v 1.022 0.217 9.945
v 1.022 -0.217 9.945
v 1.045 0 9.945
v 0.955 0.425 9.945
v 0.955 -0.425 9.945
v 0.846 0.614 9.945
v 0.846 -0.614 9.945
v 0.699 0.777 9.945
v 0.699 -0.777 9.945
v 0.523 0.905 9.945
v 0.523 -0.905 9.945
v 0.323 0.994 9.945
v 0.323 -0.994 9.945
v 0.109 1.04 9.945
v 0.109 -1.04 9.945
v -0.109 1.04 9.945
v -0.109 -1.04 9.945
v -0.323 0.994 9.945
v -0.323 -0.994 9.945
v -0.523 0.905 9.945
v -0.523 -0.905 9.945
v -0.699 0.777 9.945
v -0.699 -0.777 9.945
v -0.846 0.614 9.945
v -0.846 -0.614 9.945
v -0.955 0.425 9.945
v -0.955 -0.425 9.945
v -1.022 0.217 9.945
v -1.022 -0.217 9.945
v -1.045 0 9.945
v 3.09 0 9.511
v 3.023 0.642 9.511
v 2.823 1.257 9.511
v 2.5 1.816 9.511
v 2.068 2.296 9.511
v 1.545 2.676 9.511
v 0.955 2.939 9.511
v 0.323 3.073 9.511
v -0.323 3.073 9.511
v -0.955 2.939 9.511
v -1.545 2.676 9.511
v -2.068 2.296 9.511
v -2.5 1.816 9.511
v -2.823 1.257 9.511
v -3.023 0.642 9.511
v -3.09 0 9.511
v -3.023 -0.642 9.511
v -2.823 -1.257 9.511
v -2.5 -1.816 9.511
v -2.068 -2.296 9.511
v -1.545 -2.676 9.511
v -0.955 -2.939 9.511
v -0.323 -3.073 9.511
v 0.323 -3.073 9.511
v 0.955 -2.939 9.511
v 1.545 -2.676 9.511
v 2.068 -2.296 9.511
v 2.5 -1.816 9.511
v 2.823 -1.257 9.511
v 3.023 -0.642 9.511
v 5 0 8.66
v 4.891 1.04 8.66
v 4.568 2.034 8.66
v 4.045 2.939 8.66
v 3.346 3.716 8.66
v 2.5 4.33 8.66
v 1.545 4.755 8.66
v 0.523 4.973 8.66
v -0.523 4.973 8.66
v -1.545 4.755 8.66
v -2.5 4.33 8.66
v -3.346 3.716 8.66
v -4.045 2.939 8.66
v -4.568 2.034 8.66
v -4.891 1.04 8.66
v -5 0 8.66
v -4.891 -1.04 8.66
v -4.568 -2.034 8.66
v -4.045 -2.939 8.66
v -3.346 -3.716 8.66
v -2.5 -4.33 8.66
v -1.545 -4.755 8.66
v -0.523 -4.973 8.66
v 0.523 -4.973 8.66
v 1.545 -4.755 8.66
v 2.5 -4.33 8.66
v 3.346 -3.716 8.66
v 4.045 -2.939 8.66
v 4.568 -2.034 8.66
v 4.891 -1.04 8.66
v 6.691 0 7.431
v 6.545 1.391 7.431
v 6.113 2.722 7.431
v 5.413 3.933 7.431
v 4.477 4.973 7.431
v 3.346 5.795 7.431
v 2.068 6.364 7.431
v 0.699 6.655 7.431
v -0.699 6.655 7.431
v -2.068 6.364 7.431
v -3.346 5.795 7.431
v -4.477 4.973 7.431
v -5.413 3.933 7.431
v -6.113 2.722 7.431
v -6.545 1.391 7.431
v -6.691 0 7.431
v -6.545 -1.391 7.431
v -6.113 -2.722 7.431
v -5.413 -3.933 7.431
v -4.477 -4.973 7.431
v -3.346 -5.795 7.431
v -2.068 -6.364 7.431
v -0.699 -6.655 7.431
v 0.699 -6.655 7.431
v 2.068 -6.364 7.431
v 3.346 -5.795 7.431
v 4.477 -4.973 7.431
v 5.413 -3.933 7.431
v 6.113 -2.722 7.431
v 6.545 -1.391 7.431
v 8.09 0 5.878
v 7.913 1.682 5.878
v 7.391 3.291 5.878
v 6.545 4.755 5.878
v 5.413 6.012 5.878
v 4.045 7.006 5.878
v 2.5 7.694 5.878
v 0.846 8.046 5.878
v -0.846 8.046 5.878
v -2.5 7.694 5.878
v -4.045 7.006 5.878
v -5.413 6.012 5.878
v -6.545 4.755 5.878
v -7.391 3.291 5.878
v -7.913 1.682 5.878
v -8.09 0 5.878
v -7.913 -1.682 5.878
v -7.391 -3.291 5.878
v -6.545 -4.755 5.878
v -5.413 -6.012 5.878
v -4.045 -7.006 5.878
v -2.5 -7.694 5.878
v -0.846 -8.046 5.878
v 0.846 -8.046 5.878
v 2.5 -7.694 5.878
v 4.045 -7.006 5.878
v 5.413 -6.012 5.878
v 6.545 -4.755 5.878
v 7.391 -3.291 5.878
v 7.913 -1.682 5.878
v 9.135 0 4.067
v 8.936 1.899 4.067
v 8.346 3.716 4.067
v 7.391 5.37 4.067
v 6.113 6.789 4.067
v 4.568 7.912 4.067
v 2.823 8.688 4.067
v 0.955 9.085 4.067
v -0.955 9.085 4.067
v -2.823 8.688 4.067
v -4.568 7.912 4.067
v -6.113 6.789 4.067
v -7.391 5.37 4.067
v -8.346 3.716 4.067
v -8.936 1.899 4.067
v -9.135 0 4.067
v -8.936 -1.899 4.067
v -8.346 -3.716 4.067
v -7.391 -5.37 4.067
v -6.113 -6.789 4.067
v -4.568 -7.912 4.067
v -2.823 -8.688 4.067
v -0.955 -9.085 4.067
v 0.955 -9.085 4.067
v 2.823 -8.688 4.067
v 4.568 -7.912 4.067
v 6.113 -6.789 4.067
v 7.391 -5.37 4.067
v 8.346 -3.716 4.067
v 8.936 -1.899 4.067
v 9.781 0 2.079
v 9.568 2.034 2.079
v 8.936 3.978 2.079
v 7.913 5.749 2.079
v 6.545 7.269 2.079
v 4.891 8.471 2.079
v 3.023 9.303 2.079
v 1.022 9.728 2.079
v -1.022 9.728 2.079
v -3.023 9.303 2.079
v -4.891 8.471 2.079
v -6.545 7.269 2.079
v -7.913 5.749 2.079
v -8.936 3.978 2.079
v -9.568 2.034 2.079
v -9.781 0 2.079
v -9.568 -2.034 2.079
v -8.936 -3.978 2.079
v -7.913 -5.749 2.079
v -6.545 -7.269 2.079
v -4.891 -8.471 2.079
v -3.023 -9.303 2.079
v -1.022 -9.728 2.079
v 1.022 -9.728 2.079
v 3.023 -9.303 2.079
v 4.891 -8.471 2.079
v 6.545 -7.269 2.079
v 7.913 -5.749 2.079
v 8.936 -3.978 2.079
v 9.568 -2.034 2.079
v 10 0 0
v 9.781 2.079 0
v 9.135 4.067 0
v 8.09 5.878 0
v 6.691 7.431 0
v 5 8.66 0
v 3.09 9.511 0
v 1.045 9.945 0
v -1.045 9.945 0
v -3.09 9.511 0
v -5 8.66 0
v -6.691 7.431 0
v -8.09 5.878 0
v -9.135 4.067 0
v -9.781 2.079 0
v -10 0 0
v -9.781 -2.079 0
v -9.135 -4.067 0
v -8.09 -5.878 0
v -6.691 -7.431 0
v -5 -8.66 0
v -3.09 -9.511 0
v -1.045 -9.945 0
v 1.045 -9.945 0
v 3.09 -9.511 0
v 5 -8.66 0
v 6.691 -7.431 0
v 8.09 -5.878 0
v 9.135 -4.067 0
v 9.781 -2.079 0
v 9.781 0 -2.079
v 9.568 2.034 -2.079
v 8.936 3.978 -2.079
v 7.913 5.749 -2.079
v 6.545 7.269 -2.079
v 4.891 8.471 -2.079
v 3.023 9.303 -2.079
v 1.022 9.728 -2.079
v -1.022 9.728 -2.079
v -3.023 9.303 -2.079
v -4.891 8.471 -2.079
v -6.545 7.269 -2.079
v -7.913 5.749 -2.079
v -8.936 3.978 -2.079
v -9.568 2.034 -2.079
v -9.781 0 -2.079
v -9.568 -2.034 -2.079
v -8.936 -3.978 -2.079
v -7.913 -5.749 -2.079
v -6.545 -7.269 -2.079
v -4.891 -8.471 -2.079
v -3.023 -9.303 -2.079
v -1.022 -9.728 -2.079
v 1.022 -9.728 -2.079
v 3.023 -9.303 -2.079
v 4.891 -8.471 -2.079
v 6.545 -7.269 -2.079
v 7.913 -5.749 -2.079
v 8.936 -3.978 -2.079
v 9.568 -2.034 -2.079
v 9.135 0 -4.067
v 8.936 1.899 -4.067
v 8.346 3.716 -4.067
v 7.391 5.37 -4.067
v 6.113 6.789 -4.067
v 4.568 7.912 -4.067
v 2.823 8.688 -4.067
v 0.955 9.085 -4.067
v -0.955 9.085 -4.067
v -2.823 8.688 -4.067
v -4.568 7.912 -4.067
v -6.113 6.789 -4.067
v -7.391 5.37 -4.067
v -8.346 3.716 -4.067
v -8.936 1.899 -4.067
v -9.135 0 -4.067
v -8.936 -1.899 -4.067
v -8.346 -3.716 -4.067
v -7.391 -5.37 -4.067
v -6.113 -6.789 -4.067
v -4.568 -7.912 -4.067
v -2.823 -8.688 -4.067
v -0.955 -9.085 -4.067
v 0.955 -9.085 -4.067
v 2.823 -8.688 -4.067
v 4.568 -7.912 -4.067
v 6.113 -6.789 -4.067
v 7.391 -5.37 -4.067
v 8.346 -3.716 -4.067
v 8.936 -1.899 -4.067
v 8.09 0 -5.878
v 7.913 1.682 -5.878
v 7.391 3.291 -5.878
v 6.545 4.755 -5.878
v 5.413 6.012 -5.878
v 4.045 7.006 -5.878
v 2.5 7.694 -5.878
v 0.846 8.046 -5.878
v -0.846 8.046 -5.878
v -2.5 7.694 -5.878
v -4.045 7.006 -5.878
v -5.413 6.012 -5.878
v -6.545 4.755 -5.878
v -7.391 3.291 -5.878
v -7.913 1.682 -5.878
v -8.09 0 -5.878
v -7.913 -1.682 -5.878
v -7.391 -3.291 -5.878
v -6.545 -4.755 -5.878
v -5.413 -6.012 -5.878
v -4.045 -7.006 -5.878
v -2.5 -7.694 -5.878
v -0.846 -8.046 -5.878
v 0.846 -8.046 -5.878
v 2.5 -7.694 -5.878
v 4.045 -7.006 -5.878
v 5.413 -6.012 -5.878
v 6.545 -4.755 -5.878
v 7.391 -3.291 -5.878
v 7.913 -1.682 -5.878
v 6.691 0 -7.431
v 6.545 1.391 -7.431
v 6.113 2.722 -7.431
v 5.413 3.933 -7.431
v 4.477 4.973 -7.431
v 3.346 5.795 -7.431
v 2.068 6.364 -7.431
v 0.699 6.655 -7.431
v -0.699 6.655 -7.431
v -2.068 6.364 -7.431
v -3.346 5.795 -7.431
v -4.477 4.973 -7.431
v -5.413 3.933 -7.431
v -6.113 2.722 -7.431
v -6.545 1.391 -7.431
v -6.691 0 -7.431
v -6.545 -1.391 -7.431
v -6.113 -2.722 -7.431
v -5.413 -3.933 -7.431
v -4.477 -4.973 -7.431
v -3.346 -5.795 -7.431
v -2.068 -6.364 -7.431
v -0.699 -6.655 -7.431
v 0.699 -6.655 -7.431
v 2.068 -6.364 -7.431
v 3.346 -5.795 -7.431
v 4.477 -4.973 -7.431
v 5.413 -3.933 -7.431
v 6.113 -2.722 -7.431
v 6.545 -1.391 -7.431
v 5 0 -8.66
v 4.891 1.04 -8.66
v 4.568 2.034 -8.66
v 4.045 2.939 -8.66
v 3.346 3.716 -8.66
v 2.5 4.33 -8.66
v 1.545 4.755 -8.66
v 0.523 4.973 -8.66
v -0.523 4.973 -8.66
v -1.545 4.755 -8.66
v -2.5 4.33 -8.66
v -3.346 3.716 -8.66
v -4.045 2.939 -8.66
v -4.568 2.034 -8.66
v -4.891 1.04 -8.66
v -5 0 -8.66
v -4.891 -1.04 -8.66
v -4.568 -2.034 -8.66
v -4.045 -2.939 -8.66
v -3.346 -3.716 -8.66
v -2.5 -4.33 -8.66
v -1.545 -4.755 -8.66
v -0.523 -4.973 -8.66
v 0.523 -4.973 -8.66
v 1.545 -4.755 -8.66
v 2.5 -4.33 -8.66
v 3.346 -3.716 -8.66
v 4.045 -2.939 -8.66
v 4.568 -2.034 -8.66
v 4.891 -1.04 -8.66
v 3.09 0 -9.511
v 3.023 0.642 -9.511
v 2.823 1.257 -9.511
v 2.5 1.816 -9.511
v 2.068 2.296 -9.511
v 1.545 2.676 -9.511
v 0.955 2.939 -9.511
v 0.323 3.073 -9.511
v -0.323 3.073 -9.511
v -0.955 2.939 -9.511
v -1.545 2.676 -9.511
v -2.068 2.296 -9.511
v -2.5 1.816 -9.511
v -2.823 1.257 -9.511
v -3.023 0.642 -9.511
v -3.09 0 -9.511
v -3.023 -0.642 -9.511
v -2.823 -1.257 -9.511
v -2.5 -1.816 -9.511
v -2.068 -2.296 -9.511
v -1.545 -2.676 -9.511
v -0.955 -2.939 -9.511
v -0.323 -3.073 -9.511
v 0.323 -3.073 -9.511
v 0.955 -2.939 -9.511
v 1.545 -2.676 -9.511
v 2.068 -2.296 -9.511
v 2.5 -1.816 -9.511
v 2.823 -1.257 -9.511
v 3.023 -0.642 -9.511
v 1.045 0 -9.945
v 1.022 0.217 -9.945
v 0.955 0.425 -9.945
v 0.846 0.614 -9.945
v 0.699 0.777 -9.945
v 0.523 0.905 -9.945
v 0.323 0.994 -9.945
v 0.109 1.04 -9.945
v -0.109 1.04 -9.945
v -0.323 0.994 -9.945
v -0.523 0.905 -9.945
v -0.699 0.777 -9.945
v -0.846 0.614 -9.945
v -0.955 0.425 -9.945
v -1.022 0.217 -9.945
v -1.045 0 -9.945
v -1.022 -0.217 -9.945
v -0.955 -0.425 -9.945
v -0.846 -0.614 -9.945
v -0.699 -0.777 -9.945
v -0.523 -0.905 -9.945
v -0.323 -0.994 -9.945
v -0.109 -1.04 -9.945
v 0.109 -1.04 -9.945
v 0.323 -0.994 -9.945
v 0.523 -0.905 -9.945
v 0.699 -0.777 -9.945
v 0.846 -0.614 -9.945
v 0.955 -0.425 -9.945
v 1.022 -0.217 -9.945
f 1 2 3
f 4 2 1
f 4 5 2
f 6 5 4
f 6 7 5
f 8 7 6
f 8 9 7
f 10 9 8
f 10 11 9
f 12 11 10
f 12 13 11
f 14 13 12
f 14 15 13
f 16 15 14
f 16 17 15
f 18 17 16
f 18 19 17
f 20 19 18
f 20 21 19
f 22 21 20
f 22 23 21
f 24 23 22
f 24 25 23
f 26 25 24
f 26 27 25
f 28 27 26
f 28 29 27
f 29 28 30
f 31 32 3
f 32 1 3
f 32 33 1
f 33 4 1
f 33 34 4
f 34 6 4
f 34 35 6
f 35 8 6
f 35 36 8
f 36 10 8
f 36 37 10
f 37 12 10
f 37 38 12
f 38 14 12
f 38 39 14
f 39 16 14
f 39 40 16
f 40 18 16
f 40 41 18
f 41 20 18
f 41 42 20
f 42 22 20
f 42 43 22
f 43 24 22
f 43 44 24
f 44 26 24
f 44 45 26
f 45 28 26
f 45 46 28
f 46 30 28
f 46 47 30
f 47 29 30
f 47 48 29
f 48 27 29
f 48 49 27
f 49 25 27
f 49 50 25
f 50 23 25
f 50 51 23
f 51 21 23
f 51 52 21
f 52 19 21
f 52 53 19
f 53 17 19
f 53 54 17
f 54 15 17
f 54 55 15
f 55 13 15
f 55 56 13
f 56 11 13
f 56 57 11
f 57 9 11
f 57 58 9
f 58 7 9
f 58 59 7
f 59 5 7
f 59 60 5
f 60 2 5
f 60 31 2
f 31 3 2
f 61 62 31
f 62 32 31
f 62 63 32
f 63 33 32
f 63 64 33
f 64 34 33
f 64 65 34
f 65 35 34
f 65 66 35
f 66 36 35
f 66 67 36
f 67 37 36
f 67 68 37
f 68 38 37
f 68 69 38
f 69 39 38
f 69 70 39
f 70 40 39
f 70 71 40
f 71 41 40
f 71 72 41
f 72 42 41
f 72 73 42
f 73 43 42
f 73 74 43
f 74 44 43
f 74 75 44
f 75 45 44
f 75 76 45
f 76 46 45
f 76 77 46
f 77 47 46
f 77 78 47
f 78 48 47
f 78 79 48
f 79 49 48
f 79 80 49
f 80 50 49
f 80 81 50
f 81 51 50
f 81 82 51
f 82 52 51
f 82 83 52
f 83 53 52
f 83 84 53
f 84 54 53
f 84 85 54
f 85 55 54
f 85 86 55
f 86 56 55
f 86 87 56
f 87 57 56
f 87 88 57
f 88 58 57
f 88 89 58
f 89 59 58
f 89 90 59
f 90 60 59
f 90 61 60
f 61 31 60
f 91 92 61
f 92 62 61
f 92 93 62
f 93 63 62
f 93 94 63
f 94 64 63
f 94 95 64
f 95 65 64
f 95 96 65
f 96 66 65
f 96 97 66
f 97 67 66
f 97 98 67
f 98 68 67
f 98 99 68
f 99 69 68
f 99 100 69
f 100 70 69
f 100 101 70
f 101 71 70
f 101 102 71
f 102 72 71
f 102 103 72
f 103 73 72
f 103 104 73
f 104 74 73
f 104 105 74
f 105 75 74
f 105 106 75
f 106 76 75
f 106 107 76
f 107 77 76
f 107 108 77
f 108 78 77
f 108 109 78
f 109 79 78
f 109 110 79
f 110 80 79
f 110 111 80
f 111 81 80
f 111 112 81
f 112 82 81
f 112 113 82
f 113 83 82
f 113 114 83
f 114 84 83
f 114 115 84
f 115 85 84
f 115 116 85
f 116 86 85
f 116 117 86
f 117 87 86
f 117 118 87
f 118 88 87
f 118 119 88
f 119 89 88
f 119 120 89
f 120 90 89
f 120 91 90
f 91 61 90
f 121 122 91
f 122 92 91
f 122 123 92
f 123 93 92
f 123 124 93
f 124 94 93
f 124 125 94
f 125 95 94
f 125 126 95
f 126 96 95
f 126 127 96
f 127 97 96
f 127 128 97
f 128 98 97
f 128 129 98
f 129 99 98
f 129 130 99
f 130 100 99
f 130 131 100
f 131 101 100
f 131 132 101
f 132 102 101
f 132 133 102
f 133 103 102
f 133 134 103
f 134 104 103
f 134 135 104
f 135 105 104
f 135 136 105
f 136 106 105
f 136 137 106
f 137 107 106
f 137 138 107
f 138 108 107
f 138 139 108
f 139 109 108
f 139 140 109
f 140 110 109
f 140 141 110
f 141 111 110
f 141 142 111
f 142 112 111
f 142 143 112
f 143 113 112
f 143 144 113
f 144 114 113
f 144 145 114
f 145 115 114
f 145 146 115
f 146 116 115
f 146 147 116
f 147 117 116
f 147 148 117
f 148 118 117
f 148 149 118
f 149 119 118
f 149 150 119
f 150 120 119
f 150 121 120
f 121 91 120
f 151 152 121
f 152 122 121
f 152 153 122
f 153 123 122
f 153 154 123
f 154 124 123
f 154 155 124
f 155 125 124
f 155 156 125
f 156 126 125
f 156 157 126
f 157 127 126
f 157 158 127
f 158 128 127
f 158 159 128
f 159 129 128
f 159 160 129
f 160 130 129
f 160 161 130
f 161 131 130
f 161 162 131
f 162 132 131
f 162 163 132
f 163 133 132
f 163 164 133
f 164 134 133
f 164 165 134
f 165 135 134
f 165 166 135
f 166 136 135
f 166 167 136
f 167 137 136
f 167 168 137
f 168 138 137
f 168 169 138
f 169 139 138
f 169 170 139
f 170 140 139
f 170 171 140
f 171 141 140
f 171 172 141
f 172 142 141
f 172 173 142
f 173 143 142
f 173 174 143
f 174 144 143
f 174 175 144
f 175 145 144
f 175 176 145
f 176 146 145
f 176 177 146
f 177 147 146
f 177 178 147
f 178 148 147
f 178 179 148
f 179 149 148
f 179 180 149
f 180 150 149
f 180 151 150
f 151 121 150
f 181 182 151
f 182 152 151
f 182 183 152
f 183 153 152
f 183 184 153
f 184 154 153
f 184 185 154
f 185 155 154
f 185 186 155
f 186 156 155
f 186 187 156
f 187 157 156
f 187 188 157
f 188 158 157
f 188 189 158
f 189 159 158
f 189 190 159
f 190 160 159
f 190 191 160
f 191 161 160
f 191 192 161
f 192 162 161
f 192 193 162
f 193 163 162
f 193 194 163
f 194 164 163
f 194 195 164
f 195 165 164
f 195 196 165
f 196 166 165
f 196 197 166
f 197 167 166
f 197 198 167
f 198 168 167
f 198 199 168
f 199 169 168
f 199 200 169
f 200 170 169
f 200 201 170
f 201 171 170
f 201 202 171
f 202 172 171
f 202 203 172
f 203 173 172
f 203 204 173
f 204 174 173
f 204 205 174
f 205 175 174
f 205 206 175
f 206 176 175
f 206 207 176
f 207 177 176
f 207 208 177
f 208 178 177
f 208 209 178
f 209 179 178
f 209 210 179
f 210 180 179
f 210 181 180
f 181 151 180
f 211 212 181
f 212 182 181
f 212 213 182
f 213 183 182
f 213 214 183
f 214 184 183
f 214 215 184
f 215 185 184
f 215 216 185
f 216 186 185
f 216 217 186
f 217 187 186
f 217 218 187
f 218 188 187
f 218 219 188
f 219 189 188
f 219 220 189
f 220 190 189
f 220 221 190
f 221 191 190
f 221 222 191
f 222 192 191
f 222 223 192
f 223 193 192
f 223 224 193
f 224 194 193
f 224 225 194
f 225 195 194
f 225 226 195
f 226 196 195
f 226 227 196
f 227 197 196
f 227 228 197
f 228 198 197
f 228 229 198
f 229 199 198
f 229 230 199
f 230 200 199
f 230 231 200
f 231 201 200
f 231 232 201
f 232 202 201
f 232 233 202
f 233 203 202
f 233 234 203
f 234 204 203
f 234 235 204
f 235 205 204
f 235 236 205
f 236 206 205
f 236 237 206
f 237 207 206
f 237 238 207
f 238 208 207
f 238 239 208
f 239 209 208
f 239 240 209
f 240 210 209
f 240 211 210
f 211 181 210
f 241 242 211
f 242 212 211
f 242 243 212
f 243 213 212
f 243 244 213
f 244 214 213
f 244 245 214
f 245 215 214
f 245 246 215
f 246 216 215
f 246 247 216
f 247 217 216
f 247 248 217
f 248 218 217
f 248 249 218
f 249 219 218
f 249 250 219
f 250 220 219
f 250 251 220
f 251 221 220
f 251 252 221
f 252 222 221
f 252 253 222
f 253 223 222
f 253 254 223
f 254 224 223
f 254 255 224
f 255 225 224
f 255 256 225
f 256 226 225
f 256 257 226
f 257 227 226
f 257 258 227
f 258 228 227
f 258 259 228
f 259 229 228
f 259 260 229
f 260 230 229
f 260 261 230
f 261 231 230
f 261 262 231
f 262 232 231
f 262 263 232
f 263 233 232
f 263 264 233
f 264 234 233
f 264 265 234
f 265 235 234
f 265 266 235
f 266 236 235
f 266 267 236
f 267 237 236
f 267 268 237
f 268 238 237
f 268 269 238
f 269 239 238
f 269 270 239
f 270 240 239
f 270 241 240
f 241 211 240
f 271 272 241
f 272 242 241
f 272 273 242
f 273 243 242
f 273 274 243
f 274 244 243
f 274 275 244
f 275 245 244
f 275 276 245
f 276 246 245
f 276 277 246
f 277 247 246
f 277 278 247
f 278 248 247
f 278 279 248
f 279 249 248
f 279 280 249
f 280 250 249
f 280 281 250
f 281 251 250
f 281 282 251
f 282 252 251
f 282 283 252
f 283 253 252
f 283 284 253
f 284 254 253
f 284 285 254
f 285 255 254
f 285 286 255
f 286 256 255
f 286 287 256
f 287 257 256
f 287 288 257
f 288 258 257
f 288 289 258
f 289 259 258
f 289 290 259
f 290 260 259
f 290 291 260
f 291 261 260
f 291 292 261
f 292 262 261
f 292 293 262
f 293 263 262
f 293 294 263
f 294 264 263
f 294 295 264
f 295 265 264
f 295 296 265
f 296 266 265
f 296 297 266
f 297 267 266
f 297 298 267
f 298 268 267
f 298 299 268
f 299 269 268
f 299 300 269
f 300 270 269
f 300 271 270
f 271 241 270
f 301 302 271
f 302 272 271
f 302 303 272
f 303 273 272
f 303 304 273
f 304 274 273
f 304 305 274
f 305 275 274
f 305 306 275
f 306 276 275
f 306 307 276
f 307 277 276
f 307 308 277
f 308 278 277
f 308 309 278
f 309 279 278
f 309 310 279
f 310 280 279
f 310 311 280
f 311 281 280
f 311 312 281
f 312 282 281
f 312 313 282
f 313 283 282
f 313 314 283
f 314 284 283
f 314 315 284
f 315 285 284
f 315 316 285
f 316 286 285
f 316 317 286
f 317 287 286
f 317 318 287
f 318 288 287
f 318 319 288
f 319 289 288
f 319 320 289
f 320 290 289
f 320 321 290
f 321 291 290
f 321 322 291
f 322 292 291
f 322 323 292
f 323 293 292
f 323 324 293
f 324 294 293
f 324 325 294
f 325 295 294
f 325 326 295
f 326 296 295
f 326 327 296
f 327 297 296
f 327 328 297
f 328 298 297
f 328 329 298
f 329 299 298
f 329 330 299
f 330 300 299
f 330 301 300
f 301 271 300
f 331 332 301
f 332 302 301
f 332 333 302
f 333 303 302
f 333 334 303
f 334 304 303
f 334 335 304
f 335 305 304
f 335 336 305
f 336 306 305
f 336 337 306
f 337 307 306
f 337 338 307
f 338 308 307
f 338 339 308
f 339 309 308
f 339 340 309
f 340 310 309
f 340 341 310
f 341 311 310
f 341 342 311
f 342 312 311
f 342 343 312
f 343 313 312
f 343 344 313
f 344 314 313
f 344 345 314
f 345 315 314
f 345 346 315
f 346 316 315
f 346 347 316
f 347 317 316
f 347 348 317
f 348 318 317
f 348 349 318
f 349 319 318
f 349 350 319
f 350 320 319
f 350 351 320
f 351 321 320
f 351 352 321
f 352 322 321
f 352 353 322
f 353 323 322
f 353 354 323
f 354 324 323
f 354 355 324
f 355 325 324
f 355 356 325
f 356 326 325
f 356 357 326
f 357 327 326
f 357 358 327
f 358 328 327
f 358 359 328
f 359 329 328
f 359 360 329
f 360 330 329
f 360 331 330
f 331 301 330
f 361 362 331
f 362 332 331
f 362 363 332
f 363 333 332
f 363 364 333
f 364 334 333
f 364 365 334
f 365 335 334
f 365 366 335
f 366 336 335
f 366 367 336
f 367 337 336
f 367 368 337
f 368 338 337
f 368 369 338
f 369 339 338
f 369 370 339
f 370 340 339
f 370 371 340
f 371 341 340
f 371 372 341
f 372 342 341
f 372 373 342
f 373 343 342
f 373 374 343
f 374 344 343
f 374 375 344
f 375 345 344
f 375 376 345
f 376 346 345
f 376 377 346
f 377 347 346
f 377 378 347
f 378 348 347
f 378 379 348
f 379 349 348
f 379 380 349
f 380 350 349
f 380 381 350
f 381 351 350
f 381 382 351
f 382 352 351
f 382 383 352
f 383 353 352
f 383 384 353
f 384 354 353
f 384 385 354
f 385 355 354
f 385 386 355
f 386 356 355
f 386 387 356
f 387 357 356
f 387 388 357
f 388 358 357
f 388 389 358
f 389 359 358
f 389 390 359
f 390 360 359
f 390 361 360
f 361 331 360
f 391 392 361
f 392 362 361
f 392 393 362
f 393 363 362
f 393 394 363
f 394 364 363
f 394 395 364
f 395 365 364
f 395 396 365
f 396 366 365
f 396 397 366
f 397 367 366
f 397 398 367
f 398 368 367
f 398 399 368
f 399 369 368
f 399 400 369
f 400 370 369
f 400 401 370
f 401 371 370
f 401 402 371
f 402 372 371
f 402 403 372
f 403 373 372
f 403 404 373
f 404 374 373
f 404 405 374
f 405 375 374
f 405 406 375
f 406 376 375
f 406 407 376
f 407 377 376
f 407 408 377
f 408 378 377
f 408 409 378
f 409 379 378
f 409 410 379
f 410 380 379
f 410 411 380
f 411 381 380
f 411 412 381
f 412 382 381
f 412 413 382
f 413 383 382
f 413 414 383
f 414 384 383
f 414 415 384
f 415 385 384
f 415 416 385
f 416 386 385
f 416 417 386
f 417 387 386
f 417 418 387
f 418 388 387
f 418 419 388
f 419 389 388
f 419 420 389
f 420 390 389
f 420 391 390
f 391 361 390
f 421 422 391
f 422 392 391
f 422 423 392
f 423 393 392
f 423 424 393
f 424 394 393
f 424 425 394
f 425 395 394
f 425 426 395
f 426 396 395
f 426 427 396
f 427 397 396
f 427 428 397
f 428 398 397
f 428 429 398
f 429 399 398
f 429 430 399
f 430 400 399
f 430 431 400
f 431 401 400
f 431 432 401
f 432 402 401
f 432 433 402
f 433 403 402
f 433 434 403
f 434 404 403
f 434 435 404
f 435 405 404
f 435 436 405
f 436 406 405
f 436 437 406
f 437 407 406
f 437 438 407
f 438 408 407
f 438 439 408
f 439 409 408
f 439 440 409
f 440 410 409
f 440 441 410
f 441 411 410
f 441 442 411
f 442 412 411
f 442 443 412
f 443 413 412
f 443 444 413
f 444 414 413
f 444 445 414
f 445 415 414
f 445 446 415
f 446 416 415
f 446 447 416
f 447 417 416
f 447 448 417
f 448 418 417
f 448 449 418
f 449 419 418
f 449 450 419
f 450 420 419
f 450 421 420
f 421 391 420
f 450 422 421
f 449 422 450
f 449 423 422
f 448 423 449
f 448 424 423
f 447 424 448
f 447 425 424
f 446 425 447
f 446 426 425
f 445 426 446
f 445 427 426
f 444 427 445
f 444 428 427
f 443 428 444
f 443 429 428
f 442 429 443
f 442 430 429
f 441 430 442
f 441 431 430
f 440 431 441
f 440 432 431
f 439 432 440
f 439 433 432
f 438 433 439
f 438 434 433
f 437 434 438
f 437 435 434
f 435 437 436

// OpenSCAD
// Generated by CadMonkey
// Prompt: hey cadmonkey, create me a sphere
// Generated at: 2025-11-10 17:56:22

sphere(r=10);
